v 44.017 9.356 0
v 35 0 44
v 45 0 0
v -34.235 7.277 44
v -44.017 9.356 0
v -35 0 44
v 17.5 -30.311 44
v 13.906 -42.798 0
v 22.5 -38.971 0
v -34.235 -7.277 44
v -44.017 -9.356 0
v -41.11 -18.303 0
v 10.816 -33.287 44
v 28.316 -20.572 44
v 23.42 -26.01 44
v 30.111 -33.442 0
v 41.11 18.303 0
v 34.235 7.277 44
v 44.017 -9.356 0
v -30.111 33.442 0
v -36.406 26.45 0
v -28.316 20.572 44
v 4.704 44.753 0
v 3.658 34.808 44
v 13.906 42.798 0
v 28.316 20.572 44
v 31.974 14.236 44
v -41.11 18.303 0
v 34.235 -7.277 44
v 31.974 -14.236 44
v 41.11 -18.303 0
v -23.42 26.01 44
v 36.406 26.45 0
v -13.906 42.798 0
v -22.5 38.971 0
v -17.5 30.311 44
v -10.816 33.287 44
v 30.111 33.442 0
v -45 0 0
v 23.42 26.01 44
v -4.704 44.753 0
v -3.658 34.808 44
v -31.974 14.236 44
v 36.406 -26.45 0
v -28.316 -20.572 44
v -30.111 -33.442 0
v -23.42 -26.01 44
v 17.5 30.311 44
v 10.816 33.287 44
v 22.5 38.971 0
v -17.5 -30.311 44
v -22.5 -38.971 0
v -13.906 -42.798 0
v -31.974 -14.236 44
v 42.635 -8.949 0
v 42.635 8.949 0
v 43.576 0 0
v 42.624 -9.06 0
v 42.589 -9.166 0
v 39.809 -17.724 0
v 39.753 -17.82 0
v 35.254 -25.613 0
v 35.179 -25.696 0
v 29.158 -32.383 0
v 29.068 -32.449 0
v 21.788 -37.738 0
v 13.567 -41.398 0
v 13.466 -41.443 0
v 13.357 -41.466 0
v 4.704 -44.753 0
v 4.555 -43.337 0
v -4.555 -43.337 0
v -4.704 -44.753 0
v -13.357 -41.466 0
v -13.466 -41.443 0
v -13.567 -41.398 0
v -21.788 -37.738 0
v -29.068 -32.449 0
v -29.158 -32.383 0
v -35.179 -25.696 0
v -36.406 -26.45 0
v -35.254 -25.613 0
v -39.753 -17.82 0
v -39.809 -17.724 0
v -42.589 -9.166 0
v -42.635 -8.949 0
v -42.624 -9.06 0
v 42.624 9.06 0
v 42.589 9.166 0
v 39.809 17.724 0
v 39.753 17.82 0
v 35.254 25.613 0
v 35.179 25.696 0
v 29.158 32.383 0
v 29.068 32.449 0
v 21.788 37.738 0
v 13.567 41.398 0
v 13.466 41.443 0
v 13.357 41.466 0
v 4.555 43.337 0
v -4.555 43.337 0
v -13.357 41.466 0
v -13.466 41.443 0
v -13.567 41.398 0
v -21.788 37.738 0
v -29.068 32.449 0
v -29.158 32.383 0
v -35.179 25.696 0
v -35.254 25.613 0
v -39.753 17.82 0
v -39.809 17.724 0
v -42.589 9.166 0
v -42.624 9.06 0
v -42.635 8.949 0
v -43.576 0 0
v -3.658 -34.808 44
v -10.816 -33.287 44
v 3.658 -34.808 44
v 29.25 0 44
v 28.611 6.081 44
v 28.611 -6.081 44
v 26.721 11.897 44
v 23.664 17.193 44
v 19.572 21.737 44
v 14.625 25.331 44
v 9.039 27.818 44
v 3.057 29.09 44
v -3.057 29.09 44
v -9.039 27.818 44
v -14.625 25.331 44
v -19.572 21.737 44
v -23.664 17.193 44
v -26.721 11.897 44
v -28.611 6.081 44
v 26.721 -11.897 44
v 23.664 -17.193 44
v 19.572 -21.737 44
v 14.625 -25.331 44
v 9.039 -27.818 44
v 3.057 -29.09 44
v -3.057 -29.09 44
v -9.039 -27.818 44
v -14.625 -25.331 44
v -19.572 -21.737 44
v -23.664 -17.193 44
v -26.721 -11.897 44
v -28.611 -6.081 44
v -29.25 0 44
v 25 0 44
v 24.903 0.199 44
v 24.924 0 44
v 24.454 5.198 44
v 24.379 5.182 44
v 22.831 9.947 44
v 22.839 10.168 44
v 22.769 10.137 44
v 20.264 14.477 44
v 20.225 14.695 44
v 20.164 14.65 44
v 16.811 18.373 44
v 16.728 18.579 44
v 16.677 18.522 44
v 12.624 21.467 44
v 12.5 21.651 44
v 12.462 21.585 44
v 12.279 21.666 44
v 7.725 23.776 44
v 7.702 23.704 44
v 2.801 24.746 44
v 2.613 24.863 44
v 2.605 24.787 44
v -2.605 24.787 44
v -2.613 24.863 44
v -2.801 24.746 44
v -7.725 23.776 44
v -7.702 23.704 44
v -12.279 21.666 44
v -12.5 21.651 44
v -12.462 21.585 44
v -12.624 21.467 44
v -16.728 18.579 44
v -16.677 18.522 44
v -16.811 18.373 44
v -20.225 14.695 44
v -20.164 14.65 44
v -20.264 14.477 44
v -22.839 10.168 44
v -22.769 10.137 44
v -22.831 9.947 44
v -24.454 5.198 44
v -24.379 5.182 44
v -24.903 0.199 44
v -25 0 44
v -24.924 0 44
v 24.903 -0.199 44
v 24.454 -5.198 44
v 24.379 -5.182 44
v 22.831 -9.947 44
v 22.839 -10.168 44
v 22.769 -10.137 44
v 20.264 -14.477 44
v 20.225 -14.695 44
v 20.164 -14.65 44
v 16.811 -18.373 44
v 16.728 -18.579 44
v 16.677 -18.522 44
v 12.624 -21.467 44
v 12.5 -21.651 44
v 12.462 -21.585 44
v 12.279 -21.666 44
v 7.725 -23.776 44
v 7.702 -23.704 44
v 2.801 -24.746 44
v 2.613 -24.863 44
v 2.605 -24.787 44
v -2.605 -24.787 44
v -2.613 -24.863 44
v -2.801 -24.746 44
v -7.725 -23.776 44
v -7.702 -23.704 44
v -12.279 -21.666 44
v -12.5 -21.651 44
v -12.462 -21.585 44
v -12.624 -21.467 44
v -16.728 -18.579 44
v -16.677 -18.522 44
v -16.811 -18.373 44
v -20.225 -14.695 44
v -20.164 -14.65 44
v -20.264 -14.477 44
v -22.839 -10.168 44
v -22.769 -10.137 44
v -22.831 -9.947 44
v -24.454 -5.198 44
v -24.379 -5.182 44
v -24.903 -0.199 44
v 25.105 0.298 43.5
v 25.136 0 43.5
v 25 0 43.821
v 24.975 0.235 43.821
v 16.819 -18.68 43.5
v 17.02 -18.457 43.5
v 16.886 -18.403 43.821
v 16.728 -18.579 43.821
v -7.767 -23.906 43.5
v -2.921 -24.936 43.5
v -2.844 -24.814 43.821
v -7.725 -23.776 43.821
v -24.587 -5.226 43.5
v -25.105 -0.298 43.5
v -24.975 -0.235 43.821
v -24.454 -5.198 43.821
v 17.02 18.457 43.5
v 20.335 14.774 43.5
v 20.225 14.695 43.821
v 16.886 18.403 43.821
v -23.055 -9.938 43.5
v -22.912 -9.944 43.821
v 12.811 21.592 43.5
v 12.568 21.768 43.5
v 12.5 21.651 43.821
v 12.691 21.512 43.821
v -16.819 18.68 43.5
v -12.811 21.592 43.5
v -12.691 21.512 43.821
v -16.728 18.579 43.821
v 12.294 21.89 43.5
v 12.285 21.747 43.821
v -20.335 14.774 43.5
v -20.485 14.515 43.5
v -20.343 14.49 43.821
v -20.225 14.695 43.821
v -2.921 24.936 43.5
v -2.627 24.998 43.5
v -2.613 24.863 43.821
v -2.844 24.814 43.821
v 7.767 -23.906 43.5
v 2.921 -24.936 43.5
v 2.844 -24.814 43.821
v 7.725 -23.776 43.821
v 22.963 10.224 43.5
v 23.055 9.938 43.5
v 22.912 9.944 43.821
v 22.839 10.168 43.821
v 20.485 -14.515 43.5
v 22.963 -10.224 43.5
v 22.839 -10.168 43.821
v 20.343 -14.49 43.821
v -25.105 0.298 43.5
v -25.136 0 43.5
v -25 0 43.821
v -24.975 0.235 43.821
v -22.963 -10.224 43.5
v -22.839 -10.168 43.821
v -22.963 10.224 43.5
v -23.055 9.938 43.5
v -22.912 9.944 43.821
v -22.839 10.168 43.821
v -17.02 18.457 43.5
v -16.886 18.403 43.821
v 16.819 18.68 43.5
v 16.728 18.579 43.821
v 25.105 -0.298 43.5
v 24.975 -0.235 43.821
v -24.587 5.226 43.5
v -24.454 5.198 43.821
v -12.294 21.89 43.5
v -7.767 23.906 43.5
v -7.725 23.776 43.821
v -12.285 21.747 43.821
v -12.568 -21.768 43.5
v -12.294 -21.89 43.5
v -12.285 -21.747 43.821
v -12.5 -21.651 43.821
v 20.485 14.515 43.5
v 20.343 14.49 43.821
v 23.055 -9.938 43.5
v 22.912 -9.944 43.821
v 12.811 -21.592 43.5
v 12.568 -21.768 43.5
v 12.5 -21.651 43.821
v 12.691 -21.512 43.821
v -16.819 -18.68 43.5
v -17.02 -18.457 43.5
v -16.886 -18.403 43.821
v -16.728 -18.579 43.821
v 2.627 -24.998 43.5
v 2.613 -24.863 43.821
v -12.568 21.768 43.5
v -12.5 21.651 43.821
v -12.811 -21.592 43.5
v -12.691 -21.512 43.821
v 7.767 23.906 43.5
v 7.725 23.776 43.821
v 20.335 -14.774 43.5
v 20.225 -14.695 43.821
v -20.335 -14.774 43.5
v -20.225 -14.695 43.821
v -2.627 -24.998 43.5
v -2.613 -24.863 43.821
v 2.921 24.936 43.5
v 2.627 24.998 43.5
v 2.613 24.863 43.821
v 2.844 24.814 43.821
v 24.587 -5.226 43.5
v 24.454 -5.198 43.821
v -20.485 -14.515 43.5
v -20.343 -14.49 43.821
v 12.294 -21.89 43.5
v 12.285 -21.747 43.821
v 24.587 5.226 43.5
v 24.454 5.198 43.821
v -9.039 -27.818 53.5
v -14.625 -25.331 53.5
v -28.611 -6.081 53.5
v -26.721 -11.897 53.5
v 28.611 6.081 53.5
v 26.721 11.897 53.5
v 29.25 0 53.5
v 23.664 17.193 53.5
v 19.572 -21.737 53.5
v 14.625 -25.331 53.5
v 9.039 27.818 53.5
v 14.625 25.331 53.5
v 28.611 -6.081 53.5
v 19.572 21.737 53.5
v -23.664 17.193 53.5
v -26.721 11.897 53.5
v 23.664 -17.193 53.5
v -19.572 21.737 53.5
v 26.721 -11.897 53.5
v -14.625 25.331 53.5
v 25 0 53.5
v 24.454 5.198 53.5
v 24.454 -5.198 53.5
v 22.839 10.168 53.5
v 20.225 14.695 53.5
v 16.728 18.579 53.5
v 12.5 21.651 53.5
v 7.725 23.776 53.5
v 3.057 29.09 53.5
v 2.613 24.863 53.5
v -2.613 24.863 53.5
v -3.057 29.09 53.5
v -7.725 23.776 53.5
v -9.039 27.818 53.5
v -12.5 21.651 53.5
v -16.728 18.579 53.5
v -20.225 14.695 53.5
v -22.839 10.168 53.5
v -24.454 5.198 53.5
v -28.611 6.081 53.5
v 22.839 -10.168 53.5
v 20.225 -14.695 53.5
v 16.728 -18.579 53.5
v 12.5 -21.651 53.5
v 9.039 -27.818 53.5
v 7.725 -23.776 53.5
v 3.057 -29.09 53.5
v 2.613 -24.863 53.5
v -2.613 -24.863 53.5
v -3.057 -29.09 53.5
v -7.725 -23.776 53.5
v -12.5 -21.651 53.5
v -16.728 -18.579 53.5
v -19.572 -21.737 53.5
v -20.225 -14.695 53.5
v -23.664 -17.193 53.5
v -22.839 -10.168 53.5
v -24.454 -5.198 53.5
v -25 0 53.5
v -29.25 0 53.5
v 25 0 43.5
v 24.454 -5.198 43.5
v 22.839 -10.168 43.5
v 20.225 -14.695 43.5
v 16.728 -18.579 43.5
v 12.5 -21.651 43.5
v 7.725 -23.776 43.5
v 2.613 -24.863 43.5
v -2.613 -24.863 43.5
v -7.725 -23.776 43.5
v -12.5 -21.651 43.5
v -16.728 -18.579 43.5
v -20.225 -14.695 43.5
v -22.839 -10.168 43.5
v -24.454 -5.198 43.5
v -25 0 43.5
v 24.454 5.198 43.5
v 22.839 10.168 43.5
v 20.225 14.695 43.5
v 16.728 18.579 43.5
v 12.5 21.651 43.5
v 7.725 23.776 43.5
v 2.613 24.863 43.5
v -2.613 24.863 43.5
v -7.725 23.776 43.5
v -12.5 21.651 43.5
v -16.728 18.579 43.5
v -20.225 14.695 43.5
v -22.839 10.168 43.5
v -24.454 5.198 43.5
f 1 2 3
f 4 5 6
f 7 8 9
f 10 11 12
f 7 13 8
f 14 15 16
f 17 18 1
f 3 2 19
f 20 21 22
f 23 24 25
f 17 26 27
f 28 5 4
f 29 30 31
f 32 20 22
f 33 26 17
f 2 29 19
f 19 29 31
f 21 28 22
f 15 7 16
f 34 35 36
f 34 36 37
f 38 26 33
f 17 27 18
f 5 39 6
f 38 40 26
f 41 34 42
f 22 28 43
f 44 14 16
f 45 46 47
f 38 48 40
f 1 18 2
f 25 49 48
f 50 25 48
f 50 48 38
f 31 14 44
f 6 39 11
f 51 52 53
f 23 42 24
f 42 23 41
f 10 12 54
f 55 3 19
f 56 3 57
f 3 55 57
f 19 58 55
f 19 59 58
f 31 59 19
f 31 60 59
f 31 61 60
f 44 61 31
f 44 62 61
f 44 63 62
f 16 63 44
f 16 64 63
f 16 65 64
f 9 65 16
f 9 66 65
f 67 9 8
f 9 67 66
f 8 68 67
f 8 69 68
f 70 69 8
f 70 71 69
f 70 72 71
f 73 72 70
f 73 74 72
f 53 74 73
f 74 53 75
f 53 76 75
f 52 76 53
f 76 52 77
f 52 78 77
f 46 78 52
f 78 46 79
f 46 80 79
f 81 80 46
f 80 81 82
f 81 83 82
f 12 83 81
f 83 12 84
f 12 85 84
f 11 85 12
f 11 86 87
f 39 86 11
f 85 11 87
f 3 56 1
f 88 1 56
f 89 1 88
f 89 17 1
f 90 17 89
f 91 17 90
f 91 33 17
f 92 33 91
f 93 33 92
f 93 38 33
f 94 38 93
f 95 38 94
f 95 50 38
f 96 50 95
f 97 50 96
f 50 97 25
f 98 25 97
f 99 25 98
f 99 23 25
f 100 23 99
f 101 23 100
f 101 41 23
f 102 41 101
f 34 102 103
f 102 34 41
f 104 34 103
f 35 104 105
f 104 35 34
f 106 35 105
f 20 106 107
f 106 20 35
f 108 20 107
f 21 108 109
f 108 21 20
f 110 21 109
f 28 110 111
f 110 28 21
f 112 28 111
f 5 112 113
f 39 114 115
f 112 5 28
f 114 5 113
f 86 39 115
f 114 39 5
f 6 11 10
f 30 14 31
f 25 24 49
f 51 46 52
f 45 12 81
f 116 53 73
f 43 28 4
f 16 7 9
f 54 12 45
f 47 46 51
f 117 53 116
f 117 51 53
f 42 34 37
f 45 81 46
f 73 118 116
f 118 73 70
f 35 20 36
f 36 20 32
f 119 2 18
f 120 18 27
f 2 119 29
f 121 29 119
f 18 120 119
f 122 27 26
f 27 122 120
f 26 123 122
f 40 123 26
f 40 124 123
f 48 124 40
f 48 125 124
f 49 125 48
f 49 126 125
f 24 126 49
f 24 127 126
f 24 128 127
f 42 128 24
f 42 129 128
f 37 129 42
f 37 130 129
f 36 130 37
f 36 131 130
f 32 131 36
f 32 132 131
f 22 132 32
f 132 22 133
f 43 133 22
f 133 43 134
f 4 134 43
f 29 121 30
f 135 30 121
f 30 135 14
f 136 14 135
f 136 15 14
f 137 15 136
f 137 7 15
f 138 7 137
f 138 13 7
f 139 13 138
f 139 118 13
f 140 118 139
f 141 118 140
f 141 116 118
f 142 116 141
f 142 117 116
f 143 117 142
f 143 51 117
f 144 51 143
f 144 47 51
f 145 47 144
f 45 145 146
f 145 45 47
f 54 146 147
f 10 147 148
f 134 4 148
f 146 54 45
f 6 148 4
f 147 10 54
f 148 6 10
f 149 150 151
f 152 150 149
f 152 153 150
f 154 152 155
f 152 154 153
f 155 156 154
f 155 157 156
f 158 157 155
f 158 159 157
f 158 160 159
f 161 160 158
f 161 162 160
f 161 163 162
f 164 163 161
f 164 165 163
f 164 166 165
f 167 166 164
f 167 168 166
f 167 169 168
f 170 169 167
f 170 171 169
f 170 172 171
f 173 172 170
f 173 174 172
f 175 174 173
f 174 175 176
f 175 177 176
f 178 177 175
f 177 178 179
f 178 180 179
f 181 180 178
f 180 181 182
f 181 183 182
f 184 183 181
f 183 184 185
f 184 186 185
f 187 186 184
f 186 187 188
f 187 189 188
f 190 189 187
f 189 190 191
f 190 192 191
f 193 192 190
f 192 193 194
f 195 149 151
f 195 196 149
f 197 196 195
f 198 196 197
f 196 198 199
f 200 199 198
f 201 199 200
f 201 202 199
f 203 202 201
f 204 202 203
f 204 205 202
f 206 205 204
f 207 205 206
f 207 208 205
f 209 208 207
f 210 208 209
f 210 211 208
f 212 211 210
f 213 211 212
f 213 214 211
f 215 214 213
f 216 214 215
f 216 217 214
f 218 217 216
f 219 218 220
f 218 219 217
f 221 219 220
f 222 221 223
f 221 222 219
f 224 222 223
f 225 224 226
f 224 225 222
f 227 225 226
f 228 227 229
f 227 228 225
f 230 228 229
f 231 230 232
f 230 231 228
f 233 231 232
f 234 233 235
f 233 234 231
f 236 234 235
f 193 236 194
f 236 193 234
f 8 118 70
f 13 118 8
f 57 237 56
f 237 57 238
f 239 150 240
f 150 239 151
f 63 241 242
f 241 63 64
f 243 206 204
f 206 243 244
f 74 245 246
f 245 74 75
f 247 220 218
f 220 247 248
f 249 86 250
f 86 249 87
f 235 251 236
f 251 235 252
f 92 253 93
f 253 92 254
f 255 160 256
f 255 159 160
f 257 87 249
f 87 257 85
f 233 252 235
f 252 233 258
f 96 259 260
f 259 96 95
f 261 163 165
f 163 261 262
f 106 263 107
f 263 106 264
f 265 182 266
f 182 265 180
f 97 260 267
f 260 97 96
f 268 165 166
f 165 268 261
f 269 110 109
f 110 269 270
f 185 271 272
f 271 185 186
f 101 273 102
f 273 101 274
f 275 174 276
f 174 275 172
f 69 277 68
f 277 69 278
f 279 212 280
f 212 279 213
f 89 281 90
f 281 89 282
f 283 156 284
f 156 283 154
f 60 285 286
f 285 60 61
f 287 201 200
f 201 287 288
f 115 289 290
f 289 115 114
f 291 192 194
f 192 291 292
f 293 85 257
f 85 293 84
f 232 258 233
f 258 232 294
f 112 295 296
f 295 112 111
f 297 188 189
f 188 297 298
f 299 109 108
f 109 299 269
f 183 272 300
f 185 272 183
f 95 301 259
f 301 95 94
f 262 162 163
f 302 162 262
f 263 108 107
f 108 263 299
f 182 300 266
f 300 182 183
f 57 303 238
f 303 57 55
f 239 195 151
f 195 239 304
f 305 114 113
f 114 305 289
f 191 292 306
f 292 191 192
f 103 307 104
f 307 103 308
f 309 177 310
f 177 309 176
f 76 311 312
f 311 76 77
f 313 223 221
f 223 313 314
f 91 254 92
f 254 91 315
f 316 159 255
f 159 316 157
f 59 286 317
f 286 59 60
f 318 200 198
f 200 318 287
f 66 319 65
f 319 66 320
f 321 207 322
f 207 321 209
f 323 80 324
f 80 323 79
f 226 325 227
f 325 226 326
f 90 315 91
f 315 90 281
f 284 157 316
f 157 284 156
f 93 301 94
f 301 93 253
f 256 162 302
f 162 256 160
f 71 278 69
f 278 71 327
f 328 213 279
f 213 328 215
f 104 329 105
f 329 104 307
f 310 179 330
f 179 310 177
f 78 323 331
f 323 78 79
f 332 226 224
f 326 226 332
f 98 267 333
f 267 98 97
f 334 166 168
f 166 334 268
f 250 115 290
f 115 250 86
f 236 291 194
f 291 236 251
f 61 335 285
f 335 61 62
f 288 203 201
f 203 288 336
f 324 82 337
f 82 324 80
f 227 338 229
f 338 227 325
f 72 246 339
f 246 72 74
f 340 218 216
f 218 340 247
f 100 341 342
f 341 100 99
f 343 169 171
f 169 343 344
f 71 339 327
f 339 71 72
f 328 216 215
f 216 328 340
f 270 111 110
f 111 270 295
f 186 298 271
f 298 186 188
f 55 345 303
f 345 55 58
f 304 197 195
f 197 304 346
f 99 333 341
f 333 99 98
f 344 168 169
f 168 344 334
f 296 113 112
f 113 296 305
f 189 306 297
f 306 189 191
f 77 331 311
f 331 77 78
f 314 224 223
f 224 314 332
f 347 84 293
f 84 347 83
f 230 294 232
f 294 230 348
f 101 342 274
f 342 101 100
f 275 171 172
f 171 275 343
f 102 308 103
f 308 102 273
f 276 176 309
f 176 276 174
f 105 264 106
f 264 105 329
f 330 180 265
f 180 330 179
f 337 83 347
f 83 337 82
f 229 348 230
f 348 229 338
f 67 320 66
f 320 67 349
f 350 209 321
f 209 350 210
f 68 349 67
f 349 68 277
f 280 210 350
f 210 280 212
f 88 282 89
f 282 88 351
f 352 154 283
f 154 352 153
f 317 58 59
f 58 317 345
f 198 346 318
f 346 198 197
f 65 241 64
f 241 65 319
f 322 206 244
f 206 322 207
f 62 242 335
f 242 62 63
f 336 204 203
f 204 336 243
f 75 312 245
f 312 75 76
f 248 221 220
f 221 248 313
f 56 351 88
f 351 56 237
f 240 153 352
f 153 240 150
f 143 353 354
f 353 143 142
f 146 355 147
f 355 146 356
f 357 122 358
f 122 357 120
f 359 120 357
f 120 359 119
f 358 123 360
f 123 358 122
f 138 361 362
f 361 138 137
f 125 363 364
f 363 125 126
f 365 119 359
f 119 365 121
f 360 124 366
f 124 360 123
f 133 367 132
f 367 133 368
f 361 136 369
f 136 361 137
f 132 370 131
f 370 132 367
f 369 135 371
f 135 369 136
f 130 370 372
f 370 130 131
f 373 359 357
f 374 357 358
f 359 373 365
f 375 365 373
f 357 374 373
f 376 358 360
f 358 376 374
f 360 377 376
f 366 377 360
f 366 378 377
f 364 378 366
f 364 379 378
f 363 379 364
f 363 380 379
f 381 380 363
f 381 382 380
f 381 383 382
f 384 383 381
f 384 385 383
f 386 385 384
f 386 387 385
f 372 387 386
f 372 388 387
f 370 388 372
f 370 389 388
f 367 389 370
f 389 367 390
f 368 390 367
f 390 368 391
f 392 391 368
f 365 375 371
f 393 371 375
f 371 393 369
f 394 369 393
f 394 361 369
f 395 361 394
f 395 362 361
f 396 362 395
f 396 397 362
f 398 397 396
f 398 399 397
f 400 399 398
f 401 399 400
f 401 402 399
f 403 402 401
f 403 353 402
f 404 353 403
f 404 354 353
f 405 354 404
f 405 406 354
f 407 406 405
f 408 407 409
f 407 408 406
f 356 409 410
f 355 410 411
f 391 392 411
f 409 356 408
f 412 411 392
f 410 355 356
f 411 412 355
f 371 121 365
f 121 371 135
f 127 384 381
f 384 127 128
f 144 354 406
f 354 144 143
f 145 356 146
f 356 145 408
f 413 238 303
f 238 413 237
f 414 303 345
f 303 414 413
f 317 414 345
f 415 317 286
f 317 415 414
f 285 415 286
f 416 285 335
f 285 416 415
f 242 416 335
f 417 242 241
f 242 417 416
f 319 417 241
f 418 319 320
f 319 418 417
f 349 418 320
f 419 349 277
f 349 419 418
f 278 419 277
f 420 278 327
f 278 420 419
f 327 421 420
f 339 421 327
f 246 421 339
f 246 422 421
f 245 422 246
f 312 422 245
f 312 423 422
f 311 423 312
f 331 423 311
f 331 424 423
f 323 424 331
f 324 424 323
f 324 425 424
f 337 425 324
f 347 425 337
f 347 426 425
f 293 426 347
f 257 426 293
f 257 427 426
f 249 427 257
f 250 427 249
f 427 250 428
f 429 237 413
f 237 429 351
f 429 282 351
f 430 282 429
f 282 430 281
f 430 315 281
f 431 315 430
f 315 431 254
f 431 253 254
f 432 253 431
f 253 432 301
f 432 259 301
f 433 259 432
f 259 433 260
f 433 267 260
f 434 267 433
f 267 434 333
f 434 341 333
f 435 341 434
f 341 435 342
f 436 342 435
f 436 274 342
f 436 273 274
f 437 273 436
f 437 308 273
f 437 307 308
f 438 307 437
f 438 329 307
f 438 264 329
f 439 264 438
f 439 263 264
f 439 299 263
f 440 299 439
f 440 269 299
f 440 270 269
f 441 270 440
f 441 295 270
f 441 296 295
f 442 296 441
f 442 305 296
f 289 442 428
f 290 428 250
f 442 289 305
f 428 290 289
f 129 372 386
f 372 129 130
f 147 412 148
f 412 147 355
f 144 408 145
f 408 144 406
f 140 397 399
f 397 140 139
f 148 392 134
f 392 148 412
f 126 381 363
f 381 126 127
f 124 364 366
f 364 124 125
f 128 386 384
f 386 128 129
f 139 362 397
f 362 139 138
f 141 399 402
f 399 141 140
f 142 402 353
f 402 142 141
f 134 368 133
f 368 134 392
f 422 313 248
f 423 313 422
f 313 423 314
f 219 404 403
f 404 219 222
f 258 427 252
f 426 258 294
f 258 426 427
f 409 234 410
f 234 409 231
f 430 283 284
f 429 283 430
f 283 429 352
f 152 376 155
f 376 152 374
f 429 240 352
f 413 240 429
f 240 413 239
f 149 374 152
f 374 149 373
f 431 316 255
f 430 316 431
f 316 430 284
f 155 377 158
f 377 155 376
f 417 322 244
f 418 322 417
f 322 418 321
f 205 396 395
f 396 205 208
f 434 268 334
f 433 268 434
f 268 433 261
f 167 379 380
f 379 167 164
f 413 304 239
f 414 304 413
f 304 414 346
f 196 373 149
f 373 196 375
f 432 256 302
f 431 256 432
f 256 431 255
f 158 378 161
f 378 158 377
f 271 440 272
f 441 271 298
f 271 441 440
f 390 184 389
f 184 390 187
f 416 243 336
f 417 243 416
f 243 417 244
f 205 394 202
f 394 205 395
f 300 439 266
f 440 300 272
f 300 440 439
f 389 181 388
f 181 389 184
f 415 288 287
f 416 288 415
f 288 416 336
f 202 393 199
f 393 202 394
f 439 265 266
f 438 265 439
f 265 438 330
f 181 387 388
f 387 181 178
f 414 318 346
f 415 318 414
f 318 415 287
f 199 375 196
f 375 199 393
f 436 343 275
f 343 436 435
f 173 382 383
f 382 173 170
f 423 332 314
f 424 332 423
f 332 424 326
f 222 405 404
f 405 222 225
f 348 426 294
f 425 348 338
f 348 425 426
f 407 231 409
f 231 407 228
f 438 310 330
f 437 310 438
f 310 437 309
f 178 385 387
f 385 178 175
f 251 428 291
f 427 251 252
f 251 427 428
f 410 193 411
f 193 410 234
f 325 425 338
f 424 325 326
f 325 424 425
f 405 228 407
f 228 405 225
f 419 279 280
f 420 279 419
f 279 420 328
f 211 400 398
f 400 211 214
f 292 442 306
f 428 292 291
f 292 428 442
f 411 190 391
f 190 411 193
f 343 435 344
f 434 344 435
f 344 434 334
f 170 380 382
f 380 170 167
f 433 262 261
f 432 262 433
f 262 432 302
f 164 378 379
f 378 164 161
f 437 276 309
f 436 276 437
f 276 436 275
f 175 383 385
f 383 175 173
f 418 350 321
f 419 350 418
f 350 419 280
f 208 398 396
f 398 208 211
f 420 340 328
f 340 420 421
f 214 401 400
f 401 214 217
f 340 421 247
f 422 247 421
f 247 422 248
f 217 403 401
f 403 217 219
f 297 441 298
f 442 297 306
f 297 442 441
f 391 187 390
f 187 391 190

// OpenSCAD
// Use other one
scale([.5, .5, 1]) {
  difference() {
    union() {
 
        cylinder(44, 90, 70);
        translate([0, 0, 42]) { 
            cylinder(2, 70, 70);
        }
    }
    translate([0, 0, -1]) { 
        cylinder(46, 88, 49);
    }
}
difference() {
    translate([0, 0, 43.5]) {
        cylinder(10, 58.5, 58.5);
    } 
    translate([0, 0, 42]) { 
        cylinder(25, 50, 50);
    }
}
}
